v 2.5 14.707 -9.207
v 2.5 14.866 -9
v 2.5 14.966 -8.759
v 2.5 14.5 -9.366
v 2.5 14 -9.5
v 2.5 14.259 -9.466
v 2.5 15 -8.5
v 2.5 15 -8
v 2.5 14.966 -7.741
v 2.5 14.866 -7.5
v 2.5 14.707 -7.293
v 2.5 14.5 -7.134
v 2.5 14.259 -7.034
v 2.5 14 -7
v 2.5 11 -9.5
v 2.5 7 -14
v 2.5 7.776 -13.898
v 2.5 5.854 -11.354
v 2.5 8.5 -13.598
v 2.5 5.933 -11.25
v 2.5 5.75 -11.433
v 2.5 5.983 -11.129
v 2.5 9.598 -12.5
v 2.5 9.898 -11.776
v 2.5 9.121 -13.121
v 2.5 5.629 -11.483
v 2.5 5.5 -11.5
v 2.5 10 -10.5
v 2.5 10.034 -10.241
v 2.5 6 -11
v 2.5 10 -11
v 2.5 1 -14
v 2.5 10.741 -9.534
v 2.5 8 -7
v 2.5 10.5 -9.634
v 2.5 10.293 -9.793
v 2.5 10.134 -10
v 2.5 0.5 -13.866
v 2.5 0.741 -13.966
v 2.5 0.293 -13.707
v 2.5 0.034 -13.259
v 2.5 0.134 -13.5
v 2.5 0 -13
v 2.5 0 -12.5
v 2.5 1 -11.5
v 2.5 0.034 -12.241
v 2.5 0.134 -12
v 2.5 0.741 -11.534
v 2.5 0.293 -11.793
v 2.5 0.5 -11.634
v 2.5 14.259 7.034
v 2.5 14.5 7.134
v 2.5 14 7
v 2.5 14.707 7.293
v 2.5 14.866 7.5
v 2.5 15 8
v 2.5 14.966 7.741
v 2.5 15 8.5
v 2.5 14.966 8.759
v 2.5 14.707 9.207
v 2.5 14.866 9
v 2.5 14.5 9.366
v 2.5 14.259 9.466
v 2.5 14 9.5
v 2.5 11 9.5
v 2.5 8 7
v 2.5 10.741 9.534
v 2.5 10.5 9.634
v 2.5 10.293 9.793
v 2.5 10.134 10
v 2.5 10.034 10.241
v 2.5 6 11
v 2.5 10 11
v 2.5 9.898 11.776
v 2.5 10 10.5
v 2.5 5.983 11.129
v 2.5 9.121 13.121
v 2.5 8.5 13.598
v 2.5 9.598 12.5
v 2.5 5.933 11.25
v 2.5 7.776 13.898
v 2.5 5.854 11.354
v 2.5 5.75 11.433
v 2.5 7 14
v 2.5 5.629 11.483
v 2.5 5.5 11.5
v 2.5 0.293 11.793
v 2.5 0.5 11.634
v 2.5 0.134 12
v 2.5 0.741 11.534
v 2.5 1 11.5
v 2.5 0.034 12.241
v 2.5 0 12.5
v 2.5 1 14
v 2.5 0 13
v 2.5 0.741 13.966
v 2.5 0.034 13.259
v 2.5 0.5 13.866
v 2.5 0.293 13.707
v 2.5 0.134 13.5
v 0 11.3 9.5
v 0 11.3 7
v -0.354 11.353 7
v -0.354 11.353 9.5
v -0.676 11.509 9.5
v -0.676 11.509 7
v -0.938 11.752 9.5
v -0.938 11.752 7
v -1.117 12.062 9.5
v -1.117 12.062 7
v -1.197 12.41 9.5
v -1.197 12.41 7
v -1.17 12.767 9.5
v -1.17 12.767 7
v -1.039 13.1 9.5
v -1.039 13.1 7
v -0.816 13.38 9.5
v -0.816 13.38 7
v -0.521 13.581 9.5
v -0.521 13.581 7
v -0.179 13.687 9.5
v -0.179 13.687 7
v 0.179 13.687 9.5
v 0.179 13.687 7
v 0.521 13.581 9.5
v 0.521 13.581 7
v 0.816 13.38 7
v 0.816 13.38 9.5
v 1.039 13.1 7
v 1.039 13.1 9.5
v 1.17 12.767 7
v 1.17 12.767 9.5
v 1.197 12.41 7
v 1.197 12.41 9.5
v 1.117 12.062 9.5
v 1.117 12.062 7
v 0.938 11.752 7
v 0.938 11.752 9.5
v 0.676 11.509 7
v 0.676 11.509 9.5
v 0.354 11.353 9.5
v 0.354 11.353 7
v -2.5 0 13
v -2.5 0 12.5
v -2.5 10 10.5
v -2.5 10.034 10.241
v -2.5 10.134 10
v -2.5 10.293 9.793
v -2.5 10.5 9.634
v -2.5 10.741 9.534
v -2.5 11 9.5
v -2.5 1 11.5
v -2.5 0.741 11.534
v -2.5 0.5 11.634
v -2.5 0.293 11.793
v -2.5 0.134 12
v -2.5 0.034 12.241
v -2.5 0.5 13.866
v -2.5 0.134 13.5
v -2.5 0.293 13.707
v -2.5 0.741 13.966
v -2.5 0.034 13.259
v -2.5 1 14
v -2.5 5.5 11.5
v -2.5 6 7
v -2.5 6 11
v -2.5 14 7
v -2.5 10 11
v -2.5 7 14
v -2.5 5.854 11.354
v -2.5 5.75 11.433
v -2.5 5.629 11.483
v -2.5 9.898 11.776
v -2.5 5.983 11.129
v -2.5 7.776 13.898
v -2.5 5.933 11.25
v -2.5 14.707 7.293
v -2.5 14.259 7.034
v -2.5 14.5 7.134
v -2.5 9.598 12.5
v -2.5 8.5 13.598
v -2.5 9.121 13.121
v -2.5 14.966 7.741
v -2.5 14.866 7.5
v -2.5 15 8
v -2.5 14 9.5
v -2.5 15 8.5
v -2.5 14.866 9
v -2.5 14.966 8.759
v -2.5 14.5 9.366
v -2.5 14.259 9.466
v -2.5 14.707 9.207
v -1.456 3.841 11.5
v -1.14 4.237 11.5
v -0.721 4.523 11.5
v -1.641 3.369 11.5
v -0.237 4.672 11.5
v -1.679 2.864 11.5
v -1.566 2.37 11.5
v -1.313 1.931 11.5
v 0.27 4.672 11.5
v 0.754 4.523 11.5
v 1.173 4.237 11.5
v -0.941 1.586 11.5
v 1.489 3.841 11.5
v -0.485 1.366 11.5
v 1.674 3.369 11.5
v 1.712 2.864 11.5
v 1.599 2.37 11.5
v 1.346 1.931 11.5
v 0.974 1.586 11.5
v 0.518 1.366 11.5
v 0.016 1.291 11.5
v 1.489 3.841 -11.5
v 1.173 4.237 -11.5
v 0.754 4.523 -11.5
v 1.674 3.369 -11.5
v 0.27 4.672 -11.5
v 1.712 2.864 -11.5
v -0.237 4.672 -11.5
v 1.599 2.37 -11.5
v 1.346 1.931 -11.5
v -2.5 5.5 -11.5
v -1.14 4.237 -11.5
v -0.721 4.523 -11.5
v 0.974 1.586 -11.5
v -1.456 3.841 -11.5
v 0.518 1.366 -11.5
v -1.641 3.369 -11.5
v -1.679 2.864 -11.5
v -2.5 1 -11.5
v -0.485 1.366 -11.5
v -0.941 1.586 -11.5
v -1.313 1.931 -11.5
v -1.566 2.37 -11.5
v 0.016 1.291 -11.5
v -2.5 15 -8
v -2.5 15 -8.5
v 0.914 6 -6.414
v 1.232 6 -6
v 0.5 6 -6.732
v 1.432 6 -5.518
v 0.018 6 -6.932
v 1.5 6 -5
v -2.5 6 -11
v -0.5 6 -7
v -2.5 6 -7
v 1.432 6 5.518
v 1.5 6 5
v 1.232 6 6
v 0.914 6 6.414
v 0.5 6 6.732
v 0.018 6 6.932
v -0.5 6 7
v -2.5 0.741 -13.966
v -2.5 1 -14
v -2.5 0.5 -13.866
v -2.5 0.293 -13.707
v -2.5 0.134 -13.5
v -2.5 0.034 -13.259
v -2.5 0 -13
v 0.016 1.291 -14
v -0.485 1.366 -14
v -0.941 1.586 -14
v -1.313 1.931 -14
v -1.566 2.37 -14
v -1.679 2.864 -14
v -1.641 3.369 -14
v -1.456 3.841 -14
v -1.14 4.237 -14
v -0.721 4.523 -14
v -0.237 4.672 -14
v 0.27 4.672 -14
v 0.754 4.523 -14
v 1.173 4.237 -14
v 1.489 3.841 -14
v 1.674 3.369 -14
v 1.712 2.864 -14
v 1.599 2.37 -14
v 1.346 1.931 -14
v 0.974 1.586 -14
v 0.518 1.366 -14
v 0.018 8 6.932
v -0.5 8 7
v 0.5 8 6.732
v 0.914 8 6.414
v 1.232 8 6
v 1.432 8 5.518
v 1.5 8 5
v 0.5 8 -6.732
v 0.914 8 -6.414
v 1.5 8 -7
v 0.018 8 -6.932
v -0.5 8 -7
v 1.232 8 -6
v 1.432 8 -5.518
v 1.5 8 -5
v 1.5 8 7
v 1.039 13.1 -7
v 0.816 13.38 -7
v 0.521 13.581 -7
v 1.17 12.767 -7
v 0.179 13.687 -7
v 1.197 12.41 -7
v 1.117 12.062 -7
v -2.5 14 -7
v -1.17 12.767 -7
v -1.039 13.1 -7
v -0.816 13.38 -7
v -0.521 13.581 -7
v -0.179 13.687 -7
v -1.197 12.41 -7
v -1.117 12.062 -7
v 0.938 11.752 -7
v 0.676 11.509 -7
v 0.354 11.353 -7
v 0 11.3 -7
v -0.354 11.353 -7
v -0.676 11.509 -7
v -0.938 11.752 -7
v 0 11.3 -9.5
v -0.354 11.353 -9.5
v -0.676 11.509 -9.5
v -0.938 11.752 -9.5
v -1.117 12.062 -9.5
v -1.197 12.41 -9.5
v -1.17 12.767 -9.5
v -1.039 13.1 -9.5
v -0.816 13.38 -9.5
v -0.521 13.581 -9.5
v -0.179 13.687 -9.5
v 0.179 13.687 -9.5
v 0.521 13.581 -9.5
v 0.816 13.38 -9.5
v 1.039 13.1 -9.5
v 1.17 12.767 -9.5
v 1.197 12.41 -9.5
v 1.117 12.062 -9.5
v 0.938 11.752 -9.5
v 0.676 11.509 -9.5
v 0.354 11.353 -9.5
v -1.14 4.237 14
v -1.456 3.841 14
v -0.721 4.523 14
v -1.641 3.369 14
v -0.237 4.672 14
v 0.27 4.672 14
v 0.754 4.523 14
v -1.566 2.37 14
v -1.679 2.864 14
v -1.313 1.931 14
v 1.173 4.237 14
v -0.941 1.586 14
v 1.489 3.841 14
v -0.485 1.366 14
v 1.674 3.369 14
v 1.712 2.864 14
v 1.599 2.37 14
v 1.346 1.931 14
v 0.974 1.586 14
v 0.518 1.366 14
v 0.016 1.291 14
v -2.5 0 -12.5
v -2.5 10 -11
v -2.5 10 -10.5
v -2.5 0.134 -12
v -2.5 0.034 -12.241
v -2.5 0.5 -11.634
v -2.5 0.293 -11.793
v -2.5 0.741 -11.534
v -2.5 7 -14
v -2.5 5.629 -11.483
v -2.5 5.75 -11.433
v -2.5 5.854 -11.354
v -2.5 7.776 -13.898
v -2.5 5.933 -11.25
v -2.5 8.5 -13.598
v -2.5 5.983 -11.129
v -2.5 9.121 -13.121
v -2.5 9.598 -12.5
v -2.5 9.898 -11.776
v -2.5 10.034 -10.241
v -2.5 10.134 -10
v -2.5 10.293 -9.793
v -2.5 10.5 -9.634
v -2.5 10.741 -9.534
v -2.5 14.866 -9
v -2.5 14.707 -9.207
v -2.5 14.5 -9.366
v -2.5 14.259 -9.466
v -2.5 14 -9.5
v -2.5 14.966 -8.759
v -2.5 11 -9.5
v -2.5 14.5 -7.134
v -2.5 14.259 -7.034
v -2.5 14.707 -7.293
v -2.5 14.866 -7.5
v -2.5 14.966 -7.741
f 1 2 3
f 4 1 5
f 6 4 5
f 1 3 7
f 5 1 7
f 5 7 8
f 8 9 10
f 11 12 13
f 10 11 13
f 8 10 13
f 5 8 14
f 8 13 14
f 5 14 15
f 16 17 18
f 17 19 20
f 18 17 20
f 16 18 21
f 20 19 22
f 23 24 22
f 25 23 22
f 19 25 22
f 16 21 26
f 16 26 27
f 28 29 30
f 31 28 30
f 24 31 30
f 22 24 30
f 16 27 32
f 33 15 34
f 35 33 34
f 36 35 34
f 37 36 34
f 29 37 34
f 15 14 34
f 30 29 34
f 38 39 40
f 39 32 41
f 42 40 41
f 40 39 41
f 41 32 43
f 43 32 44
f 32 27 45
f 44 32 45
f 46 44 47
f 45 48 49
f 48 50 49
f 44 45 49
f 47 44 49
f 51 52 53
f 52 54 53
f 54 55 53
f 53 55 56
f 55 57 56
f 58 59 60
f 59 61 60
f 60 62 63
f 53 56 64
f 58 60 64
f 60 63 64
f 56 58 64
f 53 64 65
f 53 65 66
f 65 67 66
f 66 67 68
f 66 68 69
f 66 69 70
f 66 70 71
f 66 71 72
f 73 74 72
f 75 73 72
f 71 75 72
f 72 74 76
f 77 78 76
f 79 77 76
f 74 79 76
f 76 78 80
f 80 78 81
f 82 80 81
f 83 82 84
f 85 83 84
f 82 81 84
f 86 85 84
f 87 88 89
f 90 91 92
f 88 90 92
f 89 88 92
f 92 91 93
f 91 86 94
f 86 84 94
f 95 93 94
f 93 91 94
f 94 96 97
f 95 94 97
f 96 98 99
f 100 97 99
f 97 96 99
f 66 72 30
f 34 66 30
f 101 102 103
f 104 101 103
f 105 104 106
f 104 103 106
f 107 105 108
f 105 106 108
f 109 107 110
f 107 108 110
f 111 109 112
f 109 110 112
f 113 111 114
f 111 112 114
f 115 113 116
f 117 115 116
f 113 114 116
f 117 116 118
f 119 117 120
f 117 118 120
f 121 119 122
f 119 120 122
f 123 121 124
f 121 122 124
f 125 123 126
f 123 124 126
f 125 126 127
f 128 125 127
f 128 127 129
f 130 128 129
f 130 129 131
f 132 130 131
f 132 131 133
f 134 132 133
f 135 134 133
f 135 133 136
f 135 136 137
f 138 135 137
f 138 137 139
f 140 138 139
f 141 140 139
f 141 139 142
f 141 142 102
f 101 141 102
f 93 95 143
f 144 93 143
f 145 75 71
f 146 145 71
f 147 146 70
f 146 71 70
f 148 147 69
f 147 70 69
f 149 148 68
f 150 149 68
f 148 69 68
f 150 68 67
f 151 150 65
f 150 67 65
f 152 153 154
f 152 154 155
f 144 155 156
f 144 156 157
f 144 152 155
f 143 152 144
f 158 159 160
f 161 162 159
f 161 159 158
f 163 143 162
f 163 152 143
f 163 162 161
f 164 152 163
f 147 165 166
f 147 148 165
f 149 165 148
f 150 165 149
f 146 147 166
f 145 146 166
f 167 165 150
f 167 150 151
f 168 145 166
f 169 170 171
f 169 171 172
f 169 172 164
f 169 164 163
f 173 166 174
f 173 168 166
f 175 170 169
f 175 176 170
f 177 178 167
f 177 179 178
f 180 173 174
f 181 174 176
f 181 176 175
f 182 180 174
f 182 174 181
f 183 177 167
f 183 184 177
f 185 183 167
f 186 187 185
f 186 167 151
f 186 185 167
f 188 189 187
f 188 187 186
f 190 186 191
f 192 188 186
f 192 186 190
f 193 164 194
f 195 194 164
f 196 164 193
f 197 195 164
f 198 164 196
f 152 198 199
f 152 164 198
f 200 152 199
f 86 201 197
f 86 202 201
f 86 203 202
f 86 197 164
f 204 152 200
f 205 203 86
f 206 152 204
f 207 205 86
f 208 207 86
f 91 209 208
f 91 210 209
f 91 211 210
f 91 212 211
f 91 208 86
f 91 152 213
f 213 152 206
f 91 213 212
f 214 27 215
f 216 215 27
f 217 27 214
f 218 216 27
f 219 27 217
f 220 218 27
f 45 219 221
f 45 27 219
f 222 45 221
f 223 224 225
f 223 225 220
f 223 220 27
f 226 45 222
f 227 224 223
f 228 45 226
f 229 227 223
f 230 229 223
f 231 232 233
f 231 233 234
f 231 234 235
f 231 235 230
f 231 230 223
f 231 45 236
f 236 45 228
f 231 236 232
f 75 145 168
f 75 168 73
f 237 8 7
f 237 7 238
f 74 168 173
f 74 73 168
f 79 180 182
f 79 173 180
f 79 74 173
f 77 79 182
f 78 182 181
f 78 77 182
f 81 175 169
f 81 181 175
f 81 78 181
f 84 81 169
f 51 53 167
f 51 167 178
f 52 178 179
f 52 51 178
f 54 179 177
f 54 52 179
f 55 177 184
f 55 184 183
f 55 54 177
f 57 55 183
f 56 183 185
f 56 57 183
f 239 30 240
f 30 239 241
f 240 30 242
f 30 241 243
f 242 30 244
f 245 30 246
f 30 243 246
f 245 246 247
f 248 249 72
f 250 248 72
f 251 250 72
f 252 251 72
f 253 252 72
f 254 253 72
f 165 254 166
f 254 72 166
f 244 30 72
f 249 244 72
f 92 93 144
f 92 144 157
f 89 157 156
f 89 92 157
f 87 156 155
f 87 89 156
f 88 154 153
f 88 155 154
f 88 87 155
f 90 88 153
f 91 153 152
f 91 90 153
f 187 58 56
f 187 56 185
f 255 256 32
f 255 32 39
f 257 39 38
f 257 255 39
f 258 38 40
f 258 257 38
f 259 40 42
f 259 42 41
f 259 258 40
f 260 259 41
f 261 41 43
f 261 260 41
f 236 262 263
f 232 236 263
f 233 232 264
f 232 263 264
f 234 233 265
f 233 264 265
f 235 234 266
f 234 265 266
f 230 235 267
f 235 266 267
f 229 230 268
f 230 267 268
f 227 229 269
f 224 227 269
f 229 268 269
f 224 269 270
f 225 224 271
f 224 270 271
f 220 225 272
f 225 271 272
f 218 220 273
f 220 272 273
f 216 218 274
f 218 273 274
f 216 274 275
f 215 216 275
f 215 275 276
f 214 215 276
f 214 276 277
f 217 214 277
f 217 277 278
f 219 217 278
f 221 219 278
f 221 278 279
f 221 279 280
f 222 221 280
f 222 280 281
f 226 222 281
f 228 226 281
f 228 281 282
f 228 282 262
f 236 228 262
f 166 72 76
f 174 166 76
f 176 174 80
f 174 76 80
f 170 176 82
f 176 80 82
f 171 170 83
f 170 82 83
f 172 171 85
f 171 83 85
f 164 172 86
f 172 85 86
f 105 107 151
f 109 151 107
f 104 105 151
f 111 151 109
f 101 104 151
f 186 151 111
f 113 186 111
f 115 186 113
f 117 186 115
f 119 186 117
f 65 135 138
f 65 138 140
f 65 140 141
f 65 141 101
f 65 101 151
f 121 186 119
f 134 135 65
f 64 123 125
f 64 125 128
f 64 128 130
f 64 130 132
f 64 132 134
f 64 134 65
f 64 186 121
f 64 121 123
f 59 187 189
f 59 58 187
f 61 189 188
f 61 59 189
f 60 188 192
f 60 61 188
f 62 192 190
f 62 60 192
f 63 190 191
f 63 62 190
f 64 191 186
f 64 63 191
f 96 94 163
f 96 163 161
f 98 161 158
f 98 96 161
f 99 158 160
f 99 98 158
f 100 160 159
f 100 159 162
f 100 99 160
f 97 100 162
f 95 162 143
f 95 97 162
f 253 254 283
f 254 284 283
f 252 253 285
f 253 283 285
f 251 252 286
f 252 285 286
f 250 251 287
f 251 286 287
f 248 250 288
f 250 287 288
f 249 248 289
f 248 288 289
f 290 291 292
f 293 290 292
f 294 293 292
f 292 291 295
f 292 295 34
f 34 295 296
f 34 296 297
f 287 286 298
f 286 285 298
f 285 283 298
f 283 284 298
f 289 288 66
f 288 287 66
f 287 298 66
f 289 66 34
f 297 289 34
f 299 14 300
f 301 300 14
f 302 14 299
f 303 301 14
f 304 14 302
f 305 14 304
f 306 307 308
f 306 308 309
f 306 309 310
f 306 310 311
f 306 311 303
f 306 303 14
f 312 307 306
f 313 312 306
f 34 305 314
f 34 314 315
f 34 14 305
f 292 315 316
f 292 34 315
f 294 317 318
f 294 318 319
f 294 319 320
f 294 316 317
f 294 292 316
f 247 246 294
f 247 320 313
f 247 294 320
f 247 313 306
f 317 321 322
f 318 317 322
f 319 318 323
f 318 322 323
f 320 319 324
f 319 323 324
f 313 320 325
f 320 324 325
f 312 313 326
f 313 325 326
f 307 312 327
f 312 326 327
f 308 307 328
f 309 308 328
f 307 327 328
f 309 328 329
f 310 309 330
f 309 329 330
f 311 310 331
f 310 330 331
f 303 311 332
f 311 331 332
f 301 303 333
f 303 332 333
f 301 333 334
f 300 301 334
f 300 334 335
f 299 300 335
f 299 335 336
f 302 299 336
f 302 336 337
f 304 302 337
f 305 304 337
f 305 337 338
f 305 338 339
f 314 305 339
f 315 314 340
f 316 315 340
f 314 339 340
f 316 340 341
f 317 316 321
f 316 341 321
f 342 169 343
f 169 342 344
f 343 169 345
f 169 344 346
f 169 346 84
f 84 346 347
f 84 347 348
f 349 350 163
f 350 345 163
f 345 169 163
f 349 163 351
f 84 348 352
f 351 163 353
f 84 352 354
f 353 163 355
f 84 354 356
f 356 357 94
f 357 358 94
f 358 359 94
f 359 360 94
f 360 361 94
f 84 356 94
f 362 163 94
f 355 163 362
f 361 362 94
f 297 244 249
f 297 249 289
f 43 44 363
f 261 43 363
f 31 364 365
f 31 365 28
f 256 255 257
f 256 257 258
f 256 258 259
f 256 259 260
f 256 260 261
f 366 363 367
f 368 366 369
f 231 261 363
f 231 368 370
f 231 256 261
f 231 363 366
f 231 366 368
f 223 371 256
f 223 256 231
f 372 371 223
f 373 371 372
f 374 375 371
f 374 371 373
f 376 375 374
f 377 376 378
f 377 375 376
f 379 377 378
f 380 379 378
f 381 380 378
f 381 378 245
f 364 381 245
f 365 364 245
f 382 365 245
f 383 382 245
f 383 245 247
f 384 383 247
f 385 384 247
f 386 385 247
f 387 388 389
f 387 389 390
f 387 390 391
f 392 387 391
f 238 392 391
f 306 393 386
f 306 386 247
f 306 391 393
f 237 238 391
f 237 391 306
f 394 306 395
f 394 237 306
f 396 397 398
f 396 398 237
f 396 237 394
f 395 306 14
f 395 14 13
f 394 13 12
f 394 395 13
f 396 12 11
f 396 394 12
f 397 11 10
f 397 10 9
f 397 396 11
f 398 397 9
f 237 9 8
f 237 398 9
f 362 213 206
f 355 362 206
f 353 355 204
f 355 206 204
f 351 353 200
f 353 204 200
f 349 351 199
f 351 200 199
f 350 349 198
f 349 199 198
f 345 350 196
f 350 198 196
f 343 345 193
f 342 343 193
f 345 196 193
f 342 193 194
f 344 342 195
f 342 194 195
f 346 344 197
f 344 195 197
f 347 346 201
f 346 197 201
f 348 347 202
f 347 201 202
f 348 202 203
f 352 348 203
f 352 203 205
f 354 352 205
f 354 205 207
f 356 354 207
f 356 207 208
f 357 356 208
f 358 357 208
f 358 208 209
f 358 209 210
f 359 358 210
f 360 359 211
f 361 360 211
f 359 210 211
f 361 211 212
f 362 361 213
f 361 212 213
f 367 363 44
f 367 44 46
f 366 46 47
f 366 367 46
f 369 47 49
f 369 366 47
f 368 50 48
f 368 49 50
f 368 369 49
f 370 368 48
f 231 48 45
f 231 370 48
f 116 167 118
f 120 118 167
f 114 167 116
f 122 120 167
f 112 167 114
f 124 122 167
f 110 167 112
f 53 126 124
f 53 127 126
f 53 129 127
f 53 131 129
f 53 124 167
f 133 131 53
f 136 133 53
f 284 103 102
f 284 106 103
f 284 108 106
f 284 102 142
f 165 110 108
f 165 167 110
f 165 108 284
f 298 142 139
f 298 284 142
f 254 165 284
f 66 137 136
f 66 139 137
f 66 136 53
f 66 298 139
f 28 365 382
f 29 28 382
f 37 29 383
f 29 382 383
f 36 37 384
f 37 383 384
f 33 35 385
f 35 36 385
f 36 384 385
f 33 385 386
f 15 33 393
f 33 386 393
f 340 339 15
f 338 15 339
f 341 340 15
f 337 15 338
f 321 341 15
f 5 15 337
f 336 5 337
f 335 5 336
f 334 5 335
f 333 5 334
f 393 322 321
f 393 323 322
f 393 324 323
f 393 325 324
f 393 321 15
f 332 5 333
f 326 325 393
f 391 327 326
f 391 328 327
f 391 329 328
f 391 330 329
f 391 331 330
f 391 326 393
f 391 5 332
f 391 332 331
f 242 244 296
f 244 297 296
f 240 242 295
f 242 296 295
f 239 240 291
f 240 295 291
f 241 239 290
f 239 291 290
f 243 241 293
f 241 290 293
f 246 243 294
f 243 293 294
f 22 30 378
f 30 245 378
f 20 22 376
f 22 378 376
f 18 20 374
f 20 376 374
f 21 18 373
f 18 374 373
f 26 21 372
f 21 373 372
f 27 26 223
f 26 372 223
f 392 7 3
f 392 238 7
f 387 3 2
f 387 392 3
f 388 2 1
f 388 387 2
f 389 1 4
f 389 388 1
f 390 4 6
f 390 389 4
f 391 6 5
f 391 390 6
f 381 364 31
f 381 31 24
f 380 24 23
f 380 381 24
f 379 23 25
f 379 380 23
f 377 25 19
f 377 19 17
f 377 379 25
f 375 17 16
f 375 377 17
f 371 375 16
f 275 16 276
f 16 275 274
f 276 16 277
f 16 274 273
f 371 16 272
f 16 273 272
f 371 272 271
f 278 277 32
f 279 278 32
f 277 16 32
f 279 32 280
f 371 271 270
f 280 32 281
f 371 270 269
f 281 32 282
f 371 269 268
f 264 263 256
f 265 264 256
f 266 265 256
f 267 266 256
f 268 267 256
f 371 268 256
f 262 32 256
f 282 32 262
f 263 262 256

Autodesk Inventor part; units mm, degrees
ref_plane "YZ Plane" through (0, 0, 0) normal (1, 0, 0) x (0, 1, 0)
ref_plane "XZ Plane" through (0, 0, 0) normal (0, 1, 0) x (-1, 0, 0)
ref_plane "XY Plane" through (0, 0, 0) normal (0, 0, 1) x (1, 0, 0)
sketch "Эскиз1" plane through (0, 0, 0) normal (0, 1, 0) x (-1, 0, 0)
  line L0 (-7, -7) -> (7, -7)
  line L1 (7, -7) -> (7, 7)
  line L2 (7, 7) -> (-7, 7)
  line L3 (-7, 7) -> (-7, -7)
  line L4 (-7, -7) -> (7, 7) construction
  line L5 (7, -7) -> (-7, 7) construction
  line L6 (-14, -14) -> (14, -14)
  line L7 (14, -14) -> (14, 14)
  line L8 (14, 14) -> (-14, 14)
  line L9 (-14, 14) -> (-14, -14)
  line L10 (-14, -14) -> (14, 14) construction
  line L11 (14, -14) -> (-14, 14) construction
  point P0 (0, 0)
  dimension "d0" = 14
  dimension "d1" = 14
  dimension "d2" = 28
  dimension "d3" = 28
extrude "Выдавливание1" add sketch "Эскиз1" along normal blind 15
sketch "Эскиз2" plane through (0, 15, 0) normal (0, 1, 0) x (1, 0, 0)
  line L0 (9.5, 9.5) -> (-9.5, 9.5)
  line L1 (-9.5, 9.5) -> (-9.5, -9.5)
  line L2 (-9.5, -9.5) -> (9.5, -9.5)
  line L3 (9.5, -9.5) -> (9.5, 9.5)
  line L4 (9.5, 9.5) -> (-9.5, -9.5) construction
  line L5 (-9.5, 9.5) -> (9.5, -9.5) construction
  line L6 (-14, 14) -> (-14, -14) projected
  line L7 (14, 14) -> (-14, 14)
  line L8 (-14, 14) -> (-14, -14)
  line L9 (-14, -14) -> (14, -14)
  line L10 (14, -14) -> (14, 14)
  line L11 (14, 14) -> (-14, -14) construction
  line L12 (-14, 14) -> (14, -14) construction
  point P0 (0, 0)
  dimension "d6" = 19
  dimension "d7" = 19
extrude "Выдавливание2" cut sketch "Эскиз2" against normal blind 5
sketch "Эскиз4" plane through (-9.5, 15, 9.5) normal (0, 0, 1) x (1, 0, 0)
  point P0 (9.5, -15)
  point P1 (9.5, -2.5)
hole "Отверстие1" at (0, 12.5, 9.5) direction (0, 0, -1) diameter 2.4 end through all clearance for "Винт крепежный с плоской головкой" size "M2" standard "ANSI метрическая"
sketch "Эскиз5" plane through (-14, 0, 14) normal (0, 0, 1) x (1, 0, 0)
  point P0 (14, 0)
  point P1 (14.0165, 2.9909)
hole "Отверстие2" at (0.0165, 2.9909, 14) direction (0, 0, -1) diameter 3.4 end through all clearance for "Винт крепежный с плоской головкой" size "M3" standard "ANSI метрическая"
sketch "Эскиз6" plane through (0, 0, 0) normal (0, -1, 0) x (1, 0, 0)
  line L0 (11.5, -11.5) -> (-11.5, -11.5)
  line L1 (-11.5, -11.5) -> (-11.5, 11.5)
  line L2 (-11.5, 11.5) -> (11.5, 11.5)
  line L3 (11.5, 11.5) -> (11.5, -11.5)
  line L4 (11.5, -11.5) -> (-11.5, 11.5) construction
  line L5 (-11.5, -11.5) -> (11.5, 11.5) construction
  point P0 (0, 0)
  dimension "d24" = 23
  dimension "d25" = 23
extrude "Выдавливание3" cut sketch "Эскиз6" against normal blind 6
sketch "Эскиз7" plane through (-14, 0, -14) normal (-1, 0, 0) x (0, 0, 1)
  line L0 (28, 0) -> (28, 10) projected
  line L1 (28, 0) -> (0, 0)
  line L2 (0, 0) -> (0, 15.2302)
  line L3 (0, 15.2302) -> (28, 15.2302)
  line L4 (28, 15.2302) -> (28, 0)
  point P0 (14, 0)
extrude "Выдавливание4" cut sketch "Эскиз7" against normal blind 11.5
sketch "Эскиз8" plane through (14, 0, 14) normal (1, 0, 0) x (0, 0, -1)
  line L0 (0, 0) -> (28, 0) projected
  line L1 (28, 0) -> (0, 0)
  line L2 (0, 0) -> (0, 16.0654)
  line L3 (0, 16.0654) -> (28, 16.0654)
  line L4 (28, 16.0654) -> (28, 0)
  point P0 (14, 0)
extrude "Выдавливание5" cut sketch "Эскиз8" against normal blind 11.5
sketch "Эскиз9" plane through (-2.5, 6, 7) normal (0, 0, -1) x (-1, 0, 0)
  line L0 (-5, 9) -> (-5, 0) projected
  line L1 (-5, 0) -> (-4, 0)
  line L2 (-4, 0) -> (-4, 2)
  line L3 (-4, 2) -> (-5, 2)
  line L4 (-5, 2) -> (-5, 0)
  point P0 (-2.5, -6)
  dimension "d32" = 1
  dimension "d35" = 2
extrude "Выдавливание6" add sketch "Эскиз9" along normal blind 14
fillet "Сопряжение1" radius 2 2 edges at (1.5, 7, 7) (1.5, 7, -7)
fillet "Сопряжение1" radius 1 10 edges at (0, 15, 9.5) (0, 15, 7) (0, 15, -9.5) (0, 15, -7) (0, 10, -9.5) (0, 10, 9.5) (0, 0, 11.5) (0, 0, 14) (0, 0, -14) (0, 0, -11.5)
fillet "Сопряжение1" radius 0.5 2 edges at (0, 6, 11.5) (0, 6, -11.5)
fillet "Сопряжение1" radius 3 2 edges at (0, 10, -14) (0, 10, 14)
properties part number "14mmto28mm"
